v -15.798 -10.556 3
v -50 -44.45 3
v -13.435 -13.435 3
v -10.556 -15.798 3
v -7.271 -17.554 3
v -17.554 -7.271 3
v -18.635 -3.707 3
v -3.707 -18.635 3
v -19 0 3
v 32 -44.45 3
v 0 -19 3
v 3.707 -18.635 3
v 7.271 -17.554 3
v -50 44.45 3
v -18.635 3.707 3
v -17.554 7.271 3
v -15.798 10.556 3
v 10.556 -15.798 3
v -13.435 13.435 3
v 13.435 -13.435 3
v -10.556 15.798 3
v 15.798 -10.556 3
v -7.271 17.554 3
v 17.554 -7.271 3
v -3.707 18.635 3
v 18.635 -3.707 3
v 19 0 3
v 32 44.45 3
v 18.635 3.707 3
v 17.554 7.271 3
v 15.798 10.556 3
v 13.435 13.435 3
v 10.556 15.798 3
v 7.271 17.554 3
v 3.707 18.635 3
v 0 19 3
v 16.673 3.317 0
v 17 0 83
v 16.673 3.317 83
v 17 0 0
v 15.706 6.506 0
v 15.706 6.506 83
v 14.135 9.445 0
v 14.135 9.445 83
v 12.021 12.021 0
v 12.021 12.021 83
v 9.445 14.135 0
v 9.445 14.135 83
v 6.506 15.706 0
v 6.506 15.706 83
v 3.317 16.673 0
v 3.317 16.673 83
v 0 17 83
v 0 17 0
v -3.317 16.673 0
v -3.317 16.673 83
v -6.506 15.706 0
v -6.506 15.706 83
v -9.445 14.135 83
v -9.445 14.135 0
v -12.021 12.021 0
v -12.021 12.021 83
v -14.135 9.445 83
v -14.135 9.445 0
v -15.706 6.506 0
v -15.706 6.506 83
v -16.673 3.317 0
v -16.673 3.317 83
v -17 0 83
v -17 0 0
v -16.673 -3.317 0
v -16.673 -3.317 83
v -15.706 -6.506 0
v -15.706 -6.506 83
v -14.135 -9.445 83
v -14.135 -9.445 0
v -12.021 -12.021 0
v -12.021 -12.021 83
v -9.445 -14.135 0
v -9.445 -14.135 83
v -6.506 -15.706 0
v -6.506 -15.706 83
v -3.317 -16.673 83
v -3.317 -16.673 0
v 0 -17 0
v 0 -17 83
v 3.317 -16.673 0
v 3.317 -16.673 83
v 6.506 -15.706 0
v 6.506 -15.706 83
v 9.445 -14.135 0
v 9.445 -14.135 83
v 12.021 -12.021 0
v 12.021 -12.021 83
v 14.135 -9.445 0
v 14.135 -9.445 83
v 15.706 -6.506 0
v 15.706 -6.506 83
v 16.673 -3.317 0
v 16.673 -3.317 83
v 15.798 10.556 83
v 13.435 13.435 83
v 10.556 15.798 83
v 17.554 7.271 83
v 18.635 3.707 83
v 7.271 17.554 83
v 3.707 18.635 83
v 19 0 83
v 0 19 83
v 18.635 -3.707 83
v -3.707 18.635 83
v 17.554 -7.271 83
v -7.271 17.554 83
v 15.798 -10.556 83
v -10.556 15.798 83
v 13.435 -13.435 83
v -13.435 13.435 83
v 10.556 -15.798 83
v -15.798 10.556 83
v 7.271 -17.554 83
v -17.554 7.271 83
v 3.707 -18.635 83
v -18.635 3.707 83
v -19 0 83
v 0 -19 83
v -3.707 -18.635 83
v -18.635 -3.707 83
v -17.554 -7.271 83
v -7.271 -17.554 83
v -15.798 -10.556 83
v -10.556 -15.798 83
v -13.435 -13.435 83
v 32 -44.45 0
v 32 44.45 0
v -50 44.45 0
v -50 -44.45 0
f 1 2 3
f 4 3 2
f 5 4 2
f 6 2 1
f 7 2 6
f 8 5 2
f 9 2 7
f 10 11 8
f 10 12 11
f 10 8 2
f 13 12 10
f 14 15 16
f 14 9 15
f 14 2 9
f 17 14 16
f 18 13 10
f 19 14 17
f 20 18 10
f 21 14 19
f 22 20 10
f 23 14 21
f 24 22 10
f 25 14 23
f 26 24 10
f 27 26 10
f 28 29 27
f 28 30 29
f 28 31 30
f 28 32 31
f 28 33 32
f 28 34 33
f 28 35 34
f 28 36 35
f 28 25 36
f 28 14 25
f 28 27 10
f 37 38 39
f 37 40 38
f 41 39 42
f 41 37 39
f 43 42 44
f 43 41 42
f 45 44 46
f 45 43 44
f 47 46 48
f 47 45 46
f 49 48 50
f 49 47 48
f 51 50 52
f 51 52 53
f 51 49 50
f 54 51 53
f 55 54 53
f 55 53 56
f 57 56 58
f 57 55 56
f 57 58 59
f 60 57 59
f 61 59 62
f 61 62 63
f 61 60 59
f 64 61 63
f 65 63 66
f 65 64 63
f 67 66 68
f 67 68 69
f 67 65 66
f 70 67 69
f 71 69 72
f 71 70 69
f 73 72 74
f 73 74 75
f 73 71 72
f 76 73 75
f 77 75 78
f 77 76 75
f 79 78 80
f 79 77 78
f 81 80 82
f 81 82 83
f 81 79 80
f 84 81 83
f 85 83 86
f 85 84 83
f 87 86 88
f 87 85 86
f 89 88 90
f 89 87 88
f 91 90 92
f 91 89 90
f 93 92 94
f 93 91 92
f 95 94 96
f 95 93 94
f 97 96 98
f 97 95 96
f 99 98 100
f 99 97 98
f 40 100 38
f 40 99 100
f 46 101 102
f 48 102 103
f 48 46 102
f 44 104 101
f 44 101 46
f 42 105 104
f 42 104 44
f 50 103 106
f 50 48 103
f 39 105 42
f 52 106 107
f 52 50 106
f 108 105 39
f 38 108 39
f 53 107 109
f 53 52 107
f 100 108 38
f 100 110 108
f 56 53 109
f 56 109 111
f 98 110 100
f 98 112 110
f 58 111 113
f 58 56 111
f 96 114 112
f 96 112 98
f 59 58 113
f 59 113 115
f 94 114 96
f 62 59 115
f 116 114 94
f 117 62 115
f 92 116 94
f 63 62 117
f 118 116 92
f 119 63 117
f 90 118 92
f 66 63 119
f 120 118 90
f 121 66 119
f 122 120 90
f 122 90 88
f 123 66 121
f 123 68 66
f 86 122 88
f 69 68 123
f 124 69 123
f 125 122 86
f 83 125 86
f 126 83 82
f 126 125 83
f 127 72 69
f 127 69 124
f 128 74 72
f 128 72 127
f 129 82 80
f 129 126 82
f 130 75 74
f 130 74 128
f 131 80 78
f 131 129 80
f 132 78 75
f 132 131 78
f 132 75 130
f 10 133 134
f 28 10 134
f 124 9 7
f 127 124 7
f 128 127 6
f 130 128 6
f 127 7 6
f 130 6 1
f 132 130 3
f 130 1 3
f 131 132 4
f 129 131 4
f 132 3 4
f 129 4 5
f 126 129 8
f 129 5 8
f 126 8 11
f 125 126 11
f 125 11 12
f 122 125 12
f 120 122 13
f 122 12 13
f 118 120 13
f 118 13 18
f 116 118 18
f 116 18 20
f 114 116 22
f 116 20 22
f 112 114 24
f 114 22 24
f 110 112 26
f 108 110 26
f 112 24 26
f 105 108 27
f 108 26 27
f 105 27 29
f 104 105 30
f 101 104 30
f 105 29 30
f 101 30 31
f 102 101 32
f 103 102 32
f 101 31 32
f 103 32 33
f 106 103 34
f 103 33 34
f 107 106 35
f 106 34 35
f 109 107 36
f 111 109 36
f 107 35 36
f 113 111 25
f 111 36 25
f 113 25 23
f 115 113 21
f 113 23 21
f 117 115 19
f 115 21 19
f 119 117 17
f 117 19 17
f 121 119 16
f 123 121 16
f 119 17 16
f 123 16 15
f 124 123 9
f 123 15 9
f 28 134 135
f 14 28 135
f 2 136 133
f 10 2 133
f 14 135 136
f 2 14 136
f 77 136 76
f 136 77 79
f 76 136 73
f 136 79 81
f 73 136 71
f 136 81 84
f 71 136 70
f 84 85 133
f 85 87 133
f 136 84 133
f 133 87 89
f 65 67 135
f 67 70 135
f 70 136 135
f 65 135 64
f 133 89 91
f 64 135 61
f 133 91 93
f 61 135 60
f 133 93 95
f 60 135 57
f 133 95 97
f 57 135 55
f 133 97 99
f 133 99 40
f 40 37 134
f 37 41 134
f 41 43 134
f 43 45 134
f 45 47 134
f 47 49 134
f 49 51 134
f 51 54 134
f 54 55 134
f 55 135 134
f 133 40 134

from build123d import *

# Parameters (mm, degrees)
BASE_R              = 17
BOSS_EXTRUDE1_DEPTH = 3
SKETCH1_R           = 19
SKETCH1_R_2         = 17
BOSS_EXTRUDE2_DEPTH = 80


with BuildPart() as part:
    # Base → Boss-Extrude1 (new body)
    with BuildSketch(Plane.XY):
        Polygon((-50, -44.45), (0, -44.45), (32, -44.45), (32, 44.45), (-50, 44.45), align=None)
        Circle(BASE_R, mode=Mode.SUBTRACT)
    extrude(amount=BOSS_EXTRUDE1_DEPTH)

    # Sketch1 → Boss-Extrude2 (add)
    with BuildSketch(Plane.XY.offset(3)):
        with Locations(Location((0, 0, 0), (0, 0, 180))):
            Circle(SKETCH1_R)
        Circle(SKETCH1_R_2, mode=Mode.SUBTRACT)
    extrude(amount=BOSS_EXTRUDE2_DEPTH)


solid = part.part
